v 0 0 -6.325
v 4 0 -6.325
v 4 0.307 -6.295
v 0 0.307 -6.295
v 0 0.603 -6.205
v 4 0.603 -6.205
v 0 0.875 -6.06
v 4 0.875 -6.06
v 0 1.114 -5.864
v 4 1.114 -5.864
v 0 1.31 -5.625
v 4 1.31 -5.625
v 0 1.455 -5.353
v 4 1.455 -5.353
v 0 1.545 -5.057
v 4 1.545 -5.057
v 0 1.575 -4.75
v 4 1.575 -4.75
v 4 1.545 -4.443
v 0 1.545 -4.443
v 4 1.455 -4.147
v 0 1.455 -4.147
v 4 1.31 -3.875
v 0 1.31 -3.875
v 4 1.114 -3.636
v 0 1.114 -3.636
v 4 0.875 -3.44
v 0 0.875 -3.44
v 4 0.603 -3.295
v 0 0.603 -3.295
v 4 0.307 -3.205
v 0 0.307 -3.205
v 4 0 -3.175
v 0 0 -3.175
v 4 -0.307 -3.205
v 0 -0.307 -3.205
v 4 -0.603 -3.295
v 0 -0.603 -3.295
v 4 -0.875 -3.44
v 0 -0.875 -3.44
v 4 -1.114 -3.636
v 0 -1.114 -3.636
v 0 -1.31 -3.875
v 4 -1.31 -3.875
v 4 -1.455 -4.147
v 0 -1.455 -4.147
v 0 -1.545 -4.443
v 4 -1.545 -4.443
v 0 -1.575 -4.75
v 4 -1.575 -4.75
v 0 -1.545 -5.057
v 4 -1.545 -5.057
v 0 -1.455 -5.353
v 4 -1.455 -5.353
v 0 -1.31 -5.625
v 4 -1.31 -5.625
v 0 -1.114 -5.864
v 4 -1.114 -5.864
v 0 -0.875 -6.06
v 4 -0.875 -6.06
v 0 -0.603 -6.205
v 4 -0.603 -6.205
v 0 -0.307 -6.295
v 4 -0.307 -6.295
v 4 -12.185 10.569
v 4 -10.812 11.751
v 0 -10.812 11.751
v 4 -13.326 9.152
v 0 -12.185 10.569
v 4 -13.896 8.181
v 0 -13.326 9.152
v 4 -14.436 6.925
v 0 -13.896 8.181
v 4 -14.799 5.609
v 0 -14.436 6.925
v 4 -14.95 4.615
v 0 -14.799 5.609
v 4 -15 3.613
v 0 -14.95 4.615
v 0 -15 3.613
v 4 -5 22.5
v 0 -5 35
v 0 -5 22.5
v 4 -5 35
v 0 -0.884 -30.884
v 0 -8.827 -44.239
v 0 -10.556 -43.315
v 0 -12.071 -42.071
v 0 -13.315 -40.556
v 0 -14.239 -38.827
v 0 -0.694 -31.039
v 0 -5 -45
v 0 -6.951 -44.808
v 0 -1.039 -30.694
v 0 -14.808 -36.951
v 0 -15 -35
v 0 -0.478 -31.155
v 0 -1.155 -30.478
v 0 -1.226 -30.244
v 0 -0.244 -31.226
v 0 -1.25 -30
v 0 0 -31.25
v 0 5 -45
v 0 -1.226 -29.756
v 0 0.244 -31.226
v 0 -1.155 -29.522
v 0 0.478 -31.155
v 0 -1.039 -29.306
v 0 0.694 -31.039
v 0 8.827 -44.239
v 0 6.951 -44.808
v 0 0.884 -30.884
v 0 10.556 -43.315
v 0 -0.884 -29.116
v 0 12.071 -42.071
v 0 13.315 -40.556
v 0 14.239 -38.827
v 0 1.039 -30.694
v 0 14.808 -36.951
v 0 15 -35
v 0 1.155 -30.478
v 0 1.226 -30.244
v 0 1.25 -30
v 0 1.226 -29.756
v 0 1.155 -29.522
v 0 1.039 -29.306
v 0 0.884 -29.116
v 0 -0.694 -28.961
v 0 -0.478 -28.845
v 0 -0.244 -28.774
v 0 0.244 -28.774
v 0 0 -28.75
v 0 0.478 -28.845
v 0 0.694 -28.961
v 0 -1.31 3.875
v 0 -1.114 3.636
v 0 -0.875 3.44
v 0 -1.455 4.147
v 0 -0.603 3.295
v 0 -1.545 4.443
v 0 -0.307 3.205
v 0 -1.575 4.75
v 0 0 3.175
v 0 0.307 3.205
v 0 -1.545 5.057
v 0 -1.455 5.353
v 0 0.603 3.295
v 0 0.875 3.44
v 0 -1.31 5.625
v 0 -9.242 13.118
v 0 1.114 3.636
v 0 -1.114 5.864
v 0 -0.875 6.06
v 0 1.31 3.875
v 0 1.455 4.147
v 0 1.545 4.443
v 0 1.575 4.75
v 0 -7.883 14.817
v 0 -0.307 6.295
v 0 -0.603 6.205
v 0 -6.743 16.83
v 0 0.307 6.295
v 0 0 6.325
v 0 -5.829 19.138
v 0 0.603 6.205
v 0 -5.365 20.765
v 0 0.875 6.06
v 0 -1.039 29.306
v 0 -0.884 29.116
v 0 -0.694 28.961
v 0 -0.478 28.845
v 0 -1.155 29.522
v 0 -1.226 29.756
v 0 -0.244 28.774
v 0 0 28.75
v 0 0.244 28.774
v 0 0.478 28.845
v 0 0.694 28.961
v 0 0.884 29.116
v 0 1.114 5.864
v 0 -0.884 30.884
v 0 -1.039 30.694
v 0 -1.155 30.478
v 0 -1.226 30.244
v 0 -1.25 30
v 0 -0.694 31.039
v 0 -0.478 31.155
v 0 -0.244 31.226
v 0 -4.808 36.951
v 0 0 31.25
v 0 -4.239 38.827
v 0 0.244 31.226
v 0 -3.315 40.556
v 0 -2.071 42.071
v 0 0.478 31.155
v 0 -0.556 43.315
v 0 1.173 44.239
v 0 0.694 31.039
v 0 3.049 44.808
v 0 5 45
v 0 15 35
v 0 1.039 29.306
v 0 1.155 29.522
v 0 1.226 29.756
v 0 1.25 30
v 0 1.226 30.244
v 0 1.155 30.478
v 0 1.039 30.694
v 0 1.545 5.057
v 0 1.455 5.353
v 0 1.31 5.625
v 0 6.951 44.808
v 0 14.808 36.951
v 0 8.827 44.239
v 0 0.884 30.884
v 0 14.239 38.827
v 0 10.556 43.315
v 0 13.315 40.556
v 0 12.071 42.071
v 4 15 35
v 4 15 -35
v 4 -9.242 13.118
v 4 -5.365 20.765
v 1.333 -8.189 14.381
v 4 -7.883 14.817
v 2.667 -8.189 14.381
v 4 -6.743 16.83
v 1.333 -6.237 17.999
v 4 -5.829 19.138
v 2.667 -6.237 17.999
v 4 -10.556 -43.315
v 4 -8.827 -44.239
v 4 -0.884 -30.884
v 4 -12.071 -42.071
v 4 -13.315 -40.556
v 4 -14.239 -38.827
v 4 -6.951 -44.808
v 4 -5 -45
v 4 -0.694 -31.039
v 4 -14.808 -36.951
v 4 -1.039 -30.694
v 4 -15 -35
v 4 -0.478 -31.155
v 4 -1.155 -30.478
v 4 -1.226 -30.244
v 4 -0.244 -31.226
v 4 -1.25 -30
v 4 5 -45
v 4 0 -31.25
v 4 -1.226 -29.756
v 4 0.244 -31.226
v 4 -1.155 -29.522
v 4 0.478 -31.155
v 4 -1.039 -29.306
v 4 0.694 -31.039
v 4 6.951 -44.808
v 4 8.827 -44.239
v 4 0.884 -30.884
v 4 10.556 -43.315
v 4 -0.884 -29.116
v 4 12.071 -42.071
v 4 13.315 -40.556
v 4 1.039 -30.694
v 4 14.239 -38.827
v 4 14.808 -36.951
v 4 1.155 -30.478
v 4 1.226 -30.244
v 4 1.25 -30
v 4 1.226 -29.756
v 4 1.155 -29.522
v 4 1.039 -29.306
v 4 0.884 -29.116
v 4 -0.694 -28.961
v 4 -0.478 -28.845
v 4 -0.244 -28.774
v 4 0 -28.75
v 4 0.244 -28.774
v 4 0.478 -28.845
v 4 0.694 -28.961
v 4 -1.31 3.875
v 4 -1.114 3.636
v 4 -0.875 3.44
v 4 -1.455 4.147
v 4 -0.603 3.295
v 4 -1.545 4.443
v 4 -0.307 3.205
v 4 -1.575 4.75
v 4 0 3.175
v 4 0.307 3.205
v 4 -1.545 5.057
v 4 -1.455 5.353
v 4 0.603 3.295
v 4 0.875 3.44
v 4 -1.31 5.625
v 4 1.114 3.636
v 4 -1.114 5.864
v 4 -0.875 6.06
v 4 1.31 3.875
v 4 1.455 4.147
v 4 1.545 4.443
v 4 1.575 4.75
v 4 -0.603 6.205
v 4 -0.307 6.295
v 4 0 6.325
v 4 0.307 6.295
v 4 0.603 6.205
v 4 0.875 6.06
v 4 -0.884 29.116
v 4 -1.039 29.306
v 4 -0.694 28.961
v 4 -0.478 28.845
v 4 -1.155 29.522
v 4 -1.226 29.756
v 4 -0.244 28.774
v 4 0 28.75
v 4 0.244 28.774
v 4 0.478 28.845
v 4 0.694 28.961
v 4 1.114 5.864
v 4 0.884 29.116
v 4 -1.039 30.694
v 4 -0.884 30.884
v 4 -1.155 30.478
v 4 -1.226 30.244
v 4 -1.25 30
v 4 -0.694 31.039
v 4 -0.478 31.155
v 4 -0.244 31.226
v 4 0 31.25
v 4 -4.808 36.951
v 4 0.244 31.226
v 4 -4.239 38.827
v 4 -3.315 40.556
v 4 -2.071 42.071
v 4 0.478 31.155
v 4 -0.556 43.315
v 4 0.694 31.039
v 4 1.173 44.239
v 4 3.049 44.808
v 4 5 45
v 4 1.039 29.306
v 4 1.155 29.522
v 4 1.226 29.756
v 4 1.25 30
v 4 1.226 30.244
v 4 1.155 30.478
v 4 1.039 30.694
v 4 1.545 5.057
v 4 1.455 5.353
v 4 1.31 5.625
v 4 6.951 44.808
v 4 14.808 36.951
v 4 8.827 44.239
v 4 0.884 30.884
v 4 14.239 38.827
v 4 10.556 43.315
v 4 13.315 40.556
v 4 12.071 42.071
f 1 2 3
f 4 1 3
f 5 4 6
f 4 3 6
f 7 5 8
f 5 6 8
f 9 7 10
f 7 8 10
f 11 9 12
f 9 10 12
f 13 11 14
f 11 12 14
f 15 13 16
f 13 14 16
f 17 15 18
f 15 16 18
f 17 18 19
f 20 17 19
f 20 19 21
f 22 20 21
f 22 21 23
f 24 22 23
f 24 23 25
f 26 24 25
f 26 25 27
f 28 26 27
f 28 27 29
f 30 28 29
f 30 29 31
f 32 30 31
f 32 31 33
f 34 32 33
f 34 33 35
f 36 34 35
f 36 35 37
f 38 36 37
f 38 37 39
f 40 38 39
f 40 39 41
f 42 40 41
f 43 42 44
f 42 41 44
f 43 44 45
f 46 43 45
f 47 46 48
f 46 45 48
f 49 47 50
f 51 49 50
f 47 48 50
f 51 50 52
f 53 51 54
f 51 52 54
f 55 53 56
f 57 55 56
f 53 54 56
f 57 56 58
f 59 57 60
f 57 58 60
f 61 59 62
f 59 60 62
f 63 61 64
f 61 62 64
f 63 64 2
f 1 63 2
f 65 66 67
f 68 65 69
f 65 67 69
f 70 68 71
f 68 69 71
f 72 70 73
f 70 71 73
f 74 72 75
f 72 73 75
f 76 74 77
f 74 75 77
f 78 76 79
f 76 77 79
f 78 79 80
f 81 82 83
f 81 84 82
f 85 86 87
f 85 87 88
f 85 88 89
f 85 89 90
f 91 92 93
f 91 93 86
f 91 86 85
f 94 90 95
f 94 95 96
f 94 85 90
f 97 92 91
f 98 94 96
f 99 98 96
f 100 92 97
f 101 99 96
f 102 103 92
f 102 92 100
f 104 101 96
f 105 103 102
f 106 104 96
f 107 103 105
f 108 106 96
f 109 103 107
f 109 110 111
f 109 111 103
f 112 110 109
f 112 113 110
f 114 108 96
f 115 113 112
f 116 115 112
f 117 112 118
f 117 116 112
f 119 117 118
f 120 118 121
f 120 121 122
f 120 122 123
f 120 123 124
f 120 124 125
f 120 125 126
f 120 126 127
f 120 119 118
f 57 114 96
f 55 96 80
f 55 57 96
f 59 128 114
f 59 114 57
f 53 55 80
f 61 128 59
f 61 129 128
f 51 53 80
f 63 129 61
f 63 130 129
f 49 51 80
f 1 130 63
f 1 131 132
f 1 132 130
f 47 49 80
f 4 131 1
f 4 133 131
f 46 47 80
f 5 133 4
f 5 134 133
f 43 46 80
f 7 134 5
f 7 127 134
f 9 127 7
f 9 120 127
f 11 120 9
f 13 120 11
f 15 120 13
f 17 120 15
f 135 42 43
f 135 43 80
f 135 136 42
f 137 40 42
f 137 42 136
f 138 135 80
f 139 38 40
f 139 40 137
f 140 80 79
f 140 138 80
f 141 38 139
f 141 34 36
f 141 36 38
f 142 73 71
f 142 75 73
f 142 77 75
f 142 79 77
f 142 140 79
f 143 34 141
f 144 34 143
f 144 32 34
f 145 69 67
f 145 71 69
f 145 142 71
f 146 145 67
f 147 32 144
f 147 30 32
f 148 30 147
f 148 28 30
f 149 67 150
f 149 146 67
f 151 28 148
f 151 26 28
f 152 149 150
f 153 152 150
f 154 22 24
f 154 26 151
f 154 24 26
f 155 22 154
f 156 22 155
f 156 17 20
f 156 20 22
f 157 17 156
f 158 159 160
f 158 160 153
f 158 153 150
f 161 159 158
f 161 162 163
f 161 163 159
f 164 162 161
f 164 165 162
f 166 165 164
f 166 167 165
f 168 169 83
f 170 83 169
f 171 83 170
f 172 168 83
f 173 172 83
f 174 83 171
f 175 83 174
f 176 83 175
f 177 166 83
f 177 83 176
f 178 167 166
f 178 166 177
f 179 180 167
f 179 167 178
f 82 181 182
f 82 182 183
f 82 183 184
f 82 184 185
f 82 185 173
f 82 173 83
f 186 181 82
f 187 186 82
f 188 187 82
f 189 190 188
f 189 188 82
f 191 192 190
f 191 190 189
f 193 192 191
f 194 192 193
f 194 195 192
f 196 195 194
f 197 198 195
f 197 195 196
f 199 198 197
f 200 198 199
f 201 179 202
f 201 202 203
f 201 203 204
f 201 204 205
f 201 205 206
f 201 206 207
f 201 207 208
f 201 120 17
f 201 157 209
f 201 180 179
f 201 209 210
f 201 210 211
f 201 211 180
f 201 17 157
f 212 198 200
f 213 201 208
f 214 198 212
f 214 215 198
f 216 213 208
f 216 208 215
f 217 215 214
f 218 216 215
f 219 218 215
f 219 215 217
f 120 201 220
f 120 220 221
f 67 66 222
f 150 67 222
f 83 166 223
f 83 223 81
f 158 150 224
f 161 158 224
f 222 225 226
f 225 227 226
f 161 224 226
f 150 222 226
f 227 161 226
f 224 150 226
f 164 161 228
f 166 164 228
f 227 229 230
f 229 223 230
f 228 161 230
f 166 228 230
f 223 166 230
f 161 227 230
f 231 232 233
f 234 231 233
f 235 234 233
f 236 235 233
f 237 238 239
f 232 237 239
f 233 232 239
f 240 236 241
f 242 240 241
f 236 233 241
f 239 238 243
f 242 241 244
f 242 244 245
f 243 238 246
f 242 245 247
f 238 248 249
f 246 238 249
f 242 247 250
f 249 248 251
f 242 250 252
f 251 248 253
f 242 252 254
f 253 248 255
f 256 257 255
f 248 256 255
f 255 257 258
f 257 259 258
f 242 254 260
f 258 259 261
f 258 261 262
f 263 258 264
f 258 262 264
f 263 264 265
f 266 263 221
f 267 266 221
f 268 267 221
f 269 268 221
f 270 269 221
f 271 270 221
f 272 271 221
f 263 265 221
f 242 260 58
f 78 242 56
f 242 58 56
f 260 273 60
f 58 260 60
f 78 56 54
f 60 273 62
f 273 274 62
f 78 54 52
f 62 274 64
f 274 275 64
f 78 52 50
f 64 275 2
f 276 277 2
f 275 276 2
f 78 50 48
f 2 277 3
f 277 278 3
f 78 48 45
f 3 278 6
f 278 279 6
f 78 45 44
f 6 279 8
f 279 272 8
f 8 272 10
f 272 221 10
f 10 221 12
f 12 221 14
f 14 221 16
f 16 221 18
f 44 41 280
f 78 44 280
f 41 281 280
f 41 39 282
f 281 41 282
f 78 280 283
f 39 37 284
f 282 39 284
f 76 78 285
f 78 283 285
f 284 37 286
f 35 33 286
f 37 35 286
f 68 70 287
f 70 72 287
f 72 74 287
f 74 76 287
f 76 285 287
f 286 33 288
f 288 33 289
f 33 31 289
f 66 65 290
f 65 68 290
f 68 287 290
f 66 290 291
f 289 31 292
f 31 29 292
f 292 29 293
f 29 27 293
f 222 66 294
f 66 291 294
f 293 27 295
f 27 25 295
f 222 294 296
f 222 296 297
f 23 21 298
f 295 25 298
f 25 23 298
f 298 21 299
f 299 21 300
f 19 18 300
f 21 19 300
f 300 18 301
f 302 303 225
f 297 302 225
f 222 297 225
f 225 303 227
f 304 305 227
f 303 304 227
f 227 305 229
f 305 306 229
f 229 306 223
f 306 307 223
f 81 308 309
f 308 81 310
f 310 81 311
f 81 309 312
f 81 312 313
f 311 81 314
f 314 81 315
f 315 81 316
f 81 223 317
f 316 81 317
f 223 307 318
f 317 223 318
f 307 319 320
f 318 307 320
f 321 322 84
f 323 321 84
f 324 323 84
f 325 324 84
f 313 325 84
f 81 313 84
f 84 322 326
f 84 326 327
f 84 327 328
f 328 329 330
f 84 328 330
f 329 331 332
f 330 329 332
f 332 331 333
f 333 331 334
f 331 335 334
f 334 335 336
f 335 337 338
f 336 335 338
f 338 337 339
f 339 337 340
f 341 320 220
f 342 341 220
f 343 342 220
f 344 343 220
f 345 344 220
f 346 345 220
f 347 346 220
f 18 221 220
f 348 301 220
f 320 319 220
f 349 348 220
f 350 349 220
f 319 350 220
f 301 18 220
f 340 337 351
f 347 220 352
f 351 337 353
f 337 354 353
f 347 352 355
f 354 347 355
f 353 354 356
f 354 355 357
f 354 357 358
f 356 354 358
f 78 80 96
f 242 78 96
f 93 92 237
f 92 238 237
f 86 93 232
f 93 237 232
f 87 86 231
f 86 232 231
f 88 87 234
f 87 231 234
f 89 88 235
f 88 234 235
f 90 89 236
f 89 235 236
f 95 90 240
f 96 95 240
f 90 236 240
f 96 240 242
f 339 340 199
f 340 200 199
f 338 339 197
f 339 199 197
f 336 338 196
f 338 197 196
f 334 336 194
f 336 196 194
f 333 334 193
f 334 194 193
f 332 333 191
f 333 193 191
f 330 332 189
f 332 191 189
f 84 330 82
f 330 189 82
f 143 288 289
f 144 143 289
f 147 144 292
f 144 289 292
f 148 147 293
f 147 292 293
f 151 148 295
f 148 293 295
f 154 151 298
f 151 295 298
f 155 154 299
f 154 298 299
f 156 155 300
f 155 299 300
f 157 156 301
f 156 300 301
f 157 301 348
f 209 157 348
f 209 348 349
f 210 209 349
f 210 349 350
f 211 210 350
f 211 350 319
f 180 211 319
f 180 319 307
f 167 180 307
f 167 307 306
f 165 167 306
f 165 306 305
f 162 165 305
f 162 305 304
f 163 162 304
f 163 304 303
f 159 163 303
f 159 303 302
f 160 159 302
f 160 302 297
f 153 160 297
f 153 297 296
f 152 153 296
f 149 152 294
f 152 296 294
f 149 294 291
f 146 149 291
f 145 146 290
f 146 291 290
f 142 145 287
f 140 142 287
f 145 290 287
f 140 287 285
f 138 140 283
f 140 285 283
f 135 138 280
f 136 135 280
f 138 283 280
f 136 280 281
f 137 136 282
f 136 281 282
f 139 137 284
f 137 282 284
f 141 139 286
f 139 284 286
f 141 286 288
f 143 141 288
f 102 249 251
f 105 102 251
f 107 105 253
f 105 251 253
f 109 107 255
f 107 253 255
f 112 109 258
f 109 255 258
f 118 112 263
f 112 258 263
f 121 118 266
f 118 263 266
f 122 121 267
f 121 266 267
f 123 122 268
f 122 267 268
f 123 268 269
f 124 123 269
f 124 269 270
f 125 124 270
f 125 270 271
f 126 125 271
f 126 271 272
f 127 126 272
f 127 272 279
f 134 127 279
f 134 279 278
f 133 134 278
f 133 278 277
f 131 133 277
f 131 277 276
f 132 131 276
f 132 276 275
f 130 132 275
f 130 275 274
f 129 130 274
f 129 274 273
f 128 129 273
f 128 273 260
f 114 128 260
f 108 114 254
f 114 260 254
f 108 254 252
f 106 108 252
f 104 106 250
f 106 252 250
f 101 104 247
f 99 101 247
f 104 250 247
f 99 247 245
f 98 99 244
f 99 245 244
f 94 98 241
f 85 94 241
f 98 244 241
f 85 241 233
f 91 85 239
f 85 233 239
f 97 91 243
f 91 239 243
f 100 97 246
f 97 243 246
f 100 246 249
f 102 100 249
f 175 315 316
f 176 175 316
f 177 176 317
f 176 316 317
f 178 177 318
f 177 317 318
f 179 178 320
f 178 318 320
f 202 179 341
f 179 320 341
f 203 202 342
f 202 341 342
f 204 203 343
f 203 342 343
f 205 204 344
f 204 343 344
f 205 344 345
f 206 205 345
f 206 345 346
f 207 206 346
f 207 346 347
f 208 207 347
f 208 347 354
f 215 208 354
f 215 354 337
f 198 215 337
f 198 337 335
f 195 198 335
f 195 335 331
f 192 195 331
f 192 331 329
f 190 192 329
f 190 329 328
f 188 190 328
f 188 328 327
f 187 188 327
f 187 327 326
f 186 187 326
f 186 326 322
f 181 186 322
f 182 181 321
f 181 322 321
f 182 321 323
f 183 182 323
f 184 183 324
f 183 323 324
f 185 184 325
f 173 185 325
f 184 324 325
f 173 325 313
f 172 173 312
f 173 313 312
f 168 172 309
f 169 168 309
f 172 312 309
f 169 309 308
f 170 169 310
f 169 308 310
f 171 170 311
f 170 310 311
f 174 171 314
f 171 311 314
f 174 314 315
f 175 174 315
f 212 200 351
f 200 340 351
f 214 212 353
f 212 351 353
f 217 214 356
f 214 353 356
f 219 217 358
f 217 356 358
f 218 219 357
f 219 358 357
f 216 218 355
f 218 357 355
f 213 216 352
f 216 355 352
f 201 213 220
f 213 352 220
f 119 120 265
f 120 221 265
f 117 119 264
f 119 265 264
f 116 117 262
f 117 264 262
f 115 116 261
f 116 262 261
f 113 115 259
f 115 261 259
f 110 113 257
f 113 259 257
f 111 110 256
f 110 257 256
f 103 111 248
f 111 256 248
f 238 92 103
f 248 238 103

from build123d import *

# Parameters (mm, degrees)
SKETCH1_W           = 90
SKETCH1_H           = 30
BOSS_EXTRUDE1_DEPTH = 4
SKETCH6_R           = 1.575
CUT_EXTRUDE6_DEPTH  = 48.602520942
SKETCH7_R           = 1.575
CUT_EXTRUDE7_DEPTH  = 48.602520942
SKETCH13_R          = 1.25
CUT_EXTRUDE13_DEPTH = 48.602520942
SKETCH14_R          = 1.25
CUT_EXTRUDE14_DEPTH = 48.602520942
SKETCH15_W          = 15
SKETCH15_H          = 10
CUT_EXTRUDE15_DEPTH = 48.602520942
FILLET1_R           = 10
SKETCH16_W          = 20
SKETCH16_H          = 10
CUT_EXTRUDE16_DEPTH = 48.602520942
FILLET2_R           = 10
BOSS_EXTRUDE2_DEPTH = 4
FILLET3_R           = 10


with BuildPart() as part:
    # Sketch1 → Boss-Extrude1 (new body)
    with BuildSketch(Plane(origin=(0, 0, 0), x_dir=(0, 0, -1), z_dir=(1, 0, 0))):
        Rectangle(SKETCH1_W, SKETCH1_H)
    extrude(amount=BOSS_EXTRUDE1_DEPTH)

    # Sketch6 → Cut-Extrude6 (cut, through all)
    with BuildSketch(Plane(origin=(4, 0, 0), x_dir=(0, 0, -1), z_dir=(1, 0, 0))):
        with Locations((-4.75, 0)):
            Circle(SKETCH6_R)
    extrude(amount=-CUT_EXTRUDE6_DEPTH, mode=Mode.SUBTRACT)

    # Sketch7 → Cut-Extrude7 (cut, through all)
    with BuildSketch(Plane(origin=(4, 0, 0), x_dir=(0, 0, -1), z_dir=(1, 0, 0))):
        with Locations((4.75, 0)):
            Circle(SKETCH7_R)
    extrude(amount=-CUT_EXTRUDE7_DEPTH, mode=Mode.SUBTRACT)

    # Sketch13 → Cut-Extrude13 (cut, through all)
    with BuildSketch(Plane(origin=(4, 0, 0), x_dir=(0, 0, -1), z_dir=(1, 0, 0))):
        with Locations((-30, 0)):
            Circle(SKETCH13_R)
    extrude(amount=-CUT_EXTRUDE13_DEPTH, mode=Mode.SUBTRACT)

    # Sketch14 → Cut-Extrude14 (cut, through all)
    with BuildSketch(Plane(origin=(4, 0, 0), x_dir=(0, 0, -1), z_dir=(1, 0, 0))):
        with Locations((30, 0)):
            Circle(SKETCH14_R)
    extrude(amount=-CUT_EXTRUDE14_DEPTH, mode=Mode.SUBTRACT)

    # Sketch15 → Cut-Extrude15 (cut, through all)
    with BuildSketch(Plane(origin=(4, 0, 0), x_dir=(0, 0, -1), z_dir=(1, 0, 0))):
        with Locations((-37.5, -10)):
            Rectangle(SKETCH15_W, SKETCH15_H)
    extrude(amount=-CUT_EXTRUDE15_DEPTH, mode=Mode.SUBTRACT)

    # Fillet1
    fillet1_edges = [part.edges().sort_by_distance(p)[0] for p in [
        (2, -15, -45),
        (2, 15, 45),
        (2, 15, -45),
    ]]
    fillet(fillet1_edges, radius=FILLET1_R)

    # Sketch16 → Cut-Extrude16 (cut, through all)
    with BuildSketch(Plane(origin=(4, 0, 0), x_dir=(0, 0, -1), z_dir=(1, 0, 0))):
        with Locations((-20, -10)):
            Rectangle(SKETCH16_W, SKETCH16_H)
    extrude(amount=-CUT_EXTRUDE16_DEPTH, mode=Mode.SUBTRACT)

    # Fillet2
    fillet2_edges = [part.edges().sort_by_distance(p)[0] for p in [
        (2, -5, 45),
    ]]
    fillet(fillet2_edges, radius=FILLET2_R - 0.0001)  # a hair under: the kernel refuses the full size

    # Sketch17 → Boss-Extrude2 (add)
    with BuildSketch(Plane(origin=(4, 0, 0), x_dir=(0, 0, -1), z_dir=(1, 0, 0))):
        with BuildLine():
            Line((-22.5, -5), (-10, -5))
            Line((-10, -5), (-10, -15))
            add(Edge.make_bspline(
                [(-10, -15), (-10.926575713, -9.745128006), (-15.532860799, -6.228494619), (-22.5, -5)],
                knots=[0, 0, 0, 0, 1, 1, 1, 1], degree=3))
        make_face()
    extrude(amount=-BOSS_EXTRUDE2_DEPTH)

    # Fillet3
    fillet3_edges = [part.edges().sort_by_distance(p)[0] for p in [
        (2, -15, 10),
    ]]
    fillet(fillet3_edges, radius=FILLET3_R)


solid = part.part
